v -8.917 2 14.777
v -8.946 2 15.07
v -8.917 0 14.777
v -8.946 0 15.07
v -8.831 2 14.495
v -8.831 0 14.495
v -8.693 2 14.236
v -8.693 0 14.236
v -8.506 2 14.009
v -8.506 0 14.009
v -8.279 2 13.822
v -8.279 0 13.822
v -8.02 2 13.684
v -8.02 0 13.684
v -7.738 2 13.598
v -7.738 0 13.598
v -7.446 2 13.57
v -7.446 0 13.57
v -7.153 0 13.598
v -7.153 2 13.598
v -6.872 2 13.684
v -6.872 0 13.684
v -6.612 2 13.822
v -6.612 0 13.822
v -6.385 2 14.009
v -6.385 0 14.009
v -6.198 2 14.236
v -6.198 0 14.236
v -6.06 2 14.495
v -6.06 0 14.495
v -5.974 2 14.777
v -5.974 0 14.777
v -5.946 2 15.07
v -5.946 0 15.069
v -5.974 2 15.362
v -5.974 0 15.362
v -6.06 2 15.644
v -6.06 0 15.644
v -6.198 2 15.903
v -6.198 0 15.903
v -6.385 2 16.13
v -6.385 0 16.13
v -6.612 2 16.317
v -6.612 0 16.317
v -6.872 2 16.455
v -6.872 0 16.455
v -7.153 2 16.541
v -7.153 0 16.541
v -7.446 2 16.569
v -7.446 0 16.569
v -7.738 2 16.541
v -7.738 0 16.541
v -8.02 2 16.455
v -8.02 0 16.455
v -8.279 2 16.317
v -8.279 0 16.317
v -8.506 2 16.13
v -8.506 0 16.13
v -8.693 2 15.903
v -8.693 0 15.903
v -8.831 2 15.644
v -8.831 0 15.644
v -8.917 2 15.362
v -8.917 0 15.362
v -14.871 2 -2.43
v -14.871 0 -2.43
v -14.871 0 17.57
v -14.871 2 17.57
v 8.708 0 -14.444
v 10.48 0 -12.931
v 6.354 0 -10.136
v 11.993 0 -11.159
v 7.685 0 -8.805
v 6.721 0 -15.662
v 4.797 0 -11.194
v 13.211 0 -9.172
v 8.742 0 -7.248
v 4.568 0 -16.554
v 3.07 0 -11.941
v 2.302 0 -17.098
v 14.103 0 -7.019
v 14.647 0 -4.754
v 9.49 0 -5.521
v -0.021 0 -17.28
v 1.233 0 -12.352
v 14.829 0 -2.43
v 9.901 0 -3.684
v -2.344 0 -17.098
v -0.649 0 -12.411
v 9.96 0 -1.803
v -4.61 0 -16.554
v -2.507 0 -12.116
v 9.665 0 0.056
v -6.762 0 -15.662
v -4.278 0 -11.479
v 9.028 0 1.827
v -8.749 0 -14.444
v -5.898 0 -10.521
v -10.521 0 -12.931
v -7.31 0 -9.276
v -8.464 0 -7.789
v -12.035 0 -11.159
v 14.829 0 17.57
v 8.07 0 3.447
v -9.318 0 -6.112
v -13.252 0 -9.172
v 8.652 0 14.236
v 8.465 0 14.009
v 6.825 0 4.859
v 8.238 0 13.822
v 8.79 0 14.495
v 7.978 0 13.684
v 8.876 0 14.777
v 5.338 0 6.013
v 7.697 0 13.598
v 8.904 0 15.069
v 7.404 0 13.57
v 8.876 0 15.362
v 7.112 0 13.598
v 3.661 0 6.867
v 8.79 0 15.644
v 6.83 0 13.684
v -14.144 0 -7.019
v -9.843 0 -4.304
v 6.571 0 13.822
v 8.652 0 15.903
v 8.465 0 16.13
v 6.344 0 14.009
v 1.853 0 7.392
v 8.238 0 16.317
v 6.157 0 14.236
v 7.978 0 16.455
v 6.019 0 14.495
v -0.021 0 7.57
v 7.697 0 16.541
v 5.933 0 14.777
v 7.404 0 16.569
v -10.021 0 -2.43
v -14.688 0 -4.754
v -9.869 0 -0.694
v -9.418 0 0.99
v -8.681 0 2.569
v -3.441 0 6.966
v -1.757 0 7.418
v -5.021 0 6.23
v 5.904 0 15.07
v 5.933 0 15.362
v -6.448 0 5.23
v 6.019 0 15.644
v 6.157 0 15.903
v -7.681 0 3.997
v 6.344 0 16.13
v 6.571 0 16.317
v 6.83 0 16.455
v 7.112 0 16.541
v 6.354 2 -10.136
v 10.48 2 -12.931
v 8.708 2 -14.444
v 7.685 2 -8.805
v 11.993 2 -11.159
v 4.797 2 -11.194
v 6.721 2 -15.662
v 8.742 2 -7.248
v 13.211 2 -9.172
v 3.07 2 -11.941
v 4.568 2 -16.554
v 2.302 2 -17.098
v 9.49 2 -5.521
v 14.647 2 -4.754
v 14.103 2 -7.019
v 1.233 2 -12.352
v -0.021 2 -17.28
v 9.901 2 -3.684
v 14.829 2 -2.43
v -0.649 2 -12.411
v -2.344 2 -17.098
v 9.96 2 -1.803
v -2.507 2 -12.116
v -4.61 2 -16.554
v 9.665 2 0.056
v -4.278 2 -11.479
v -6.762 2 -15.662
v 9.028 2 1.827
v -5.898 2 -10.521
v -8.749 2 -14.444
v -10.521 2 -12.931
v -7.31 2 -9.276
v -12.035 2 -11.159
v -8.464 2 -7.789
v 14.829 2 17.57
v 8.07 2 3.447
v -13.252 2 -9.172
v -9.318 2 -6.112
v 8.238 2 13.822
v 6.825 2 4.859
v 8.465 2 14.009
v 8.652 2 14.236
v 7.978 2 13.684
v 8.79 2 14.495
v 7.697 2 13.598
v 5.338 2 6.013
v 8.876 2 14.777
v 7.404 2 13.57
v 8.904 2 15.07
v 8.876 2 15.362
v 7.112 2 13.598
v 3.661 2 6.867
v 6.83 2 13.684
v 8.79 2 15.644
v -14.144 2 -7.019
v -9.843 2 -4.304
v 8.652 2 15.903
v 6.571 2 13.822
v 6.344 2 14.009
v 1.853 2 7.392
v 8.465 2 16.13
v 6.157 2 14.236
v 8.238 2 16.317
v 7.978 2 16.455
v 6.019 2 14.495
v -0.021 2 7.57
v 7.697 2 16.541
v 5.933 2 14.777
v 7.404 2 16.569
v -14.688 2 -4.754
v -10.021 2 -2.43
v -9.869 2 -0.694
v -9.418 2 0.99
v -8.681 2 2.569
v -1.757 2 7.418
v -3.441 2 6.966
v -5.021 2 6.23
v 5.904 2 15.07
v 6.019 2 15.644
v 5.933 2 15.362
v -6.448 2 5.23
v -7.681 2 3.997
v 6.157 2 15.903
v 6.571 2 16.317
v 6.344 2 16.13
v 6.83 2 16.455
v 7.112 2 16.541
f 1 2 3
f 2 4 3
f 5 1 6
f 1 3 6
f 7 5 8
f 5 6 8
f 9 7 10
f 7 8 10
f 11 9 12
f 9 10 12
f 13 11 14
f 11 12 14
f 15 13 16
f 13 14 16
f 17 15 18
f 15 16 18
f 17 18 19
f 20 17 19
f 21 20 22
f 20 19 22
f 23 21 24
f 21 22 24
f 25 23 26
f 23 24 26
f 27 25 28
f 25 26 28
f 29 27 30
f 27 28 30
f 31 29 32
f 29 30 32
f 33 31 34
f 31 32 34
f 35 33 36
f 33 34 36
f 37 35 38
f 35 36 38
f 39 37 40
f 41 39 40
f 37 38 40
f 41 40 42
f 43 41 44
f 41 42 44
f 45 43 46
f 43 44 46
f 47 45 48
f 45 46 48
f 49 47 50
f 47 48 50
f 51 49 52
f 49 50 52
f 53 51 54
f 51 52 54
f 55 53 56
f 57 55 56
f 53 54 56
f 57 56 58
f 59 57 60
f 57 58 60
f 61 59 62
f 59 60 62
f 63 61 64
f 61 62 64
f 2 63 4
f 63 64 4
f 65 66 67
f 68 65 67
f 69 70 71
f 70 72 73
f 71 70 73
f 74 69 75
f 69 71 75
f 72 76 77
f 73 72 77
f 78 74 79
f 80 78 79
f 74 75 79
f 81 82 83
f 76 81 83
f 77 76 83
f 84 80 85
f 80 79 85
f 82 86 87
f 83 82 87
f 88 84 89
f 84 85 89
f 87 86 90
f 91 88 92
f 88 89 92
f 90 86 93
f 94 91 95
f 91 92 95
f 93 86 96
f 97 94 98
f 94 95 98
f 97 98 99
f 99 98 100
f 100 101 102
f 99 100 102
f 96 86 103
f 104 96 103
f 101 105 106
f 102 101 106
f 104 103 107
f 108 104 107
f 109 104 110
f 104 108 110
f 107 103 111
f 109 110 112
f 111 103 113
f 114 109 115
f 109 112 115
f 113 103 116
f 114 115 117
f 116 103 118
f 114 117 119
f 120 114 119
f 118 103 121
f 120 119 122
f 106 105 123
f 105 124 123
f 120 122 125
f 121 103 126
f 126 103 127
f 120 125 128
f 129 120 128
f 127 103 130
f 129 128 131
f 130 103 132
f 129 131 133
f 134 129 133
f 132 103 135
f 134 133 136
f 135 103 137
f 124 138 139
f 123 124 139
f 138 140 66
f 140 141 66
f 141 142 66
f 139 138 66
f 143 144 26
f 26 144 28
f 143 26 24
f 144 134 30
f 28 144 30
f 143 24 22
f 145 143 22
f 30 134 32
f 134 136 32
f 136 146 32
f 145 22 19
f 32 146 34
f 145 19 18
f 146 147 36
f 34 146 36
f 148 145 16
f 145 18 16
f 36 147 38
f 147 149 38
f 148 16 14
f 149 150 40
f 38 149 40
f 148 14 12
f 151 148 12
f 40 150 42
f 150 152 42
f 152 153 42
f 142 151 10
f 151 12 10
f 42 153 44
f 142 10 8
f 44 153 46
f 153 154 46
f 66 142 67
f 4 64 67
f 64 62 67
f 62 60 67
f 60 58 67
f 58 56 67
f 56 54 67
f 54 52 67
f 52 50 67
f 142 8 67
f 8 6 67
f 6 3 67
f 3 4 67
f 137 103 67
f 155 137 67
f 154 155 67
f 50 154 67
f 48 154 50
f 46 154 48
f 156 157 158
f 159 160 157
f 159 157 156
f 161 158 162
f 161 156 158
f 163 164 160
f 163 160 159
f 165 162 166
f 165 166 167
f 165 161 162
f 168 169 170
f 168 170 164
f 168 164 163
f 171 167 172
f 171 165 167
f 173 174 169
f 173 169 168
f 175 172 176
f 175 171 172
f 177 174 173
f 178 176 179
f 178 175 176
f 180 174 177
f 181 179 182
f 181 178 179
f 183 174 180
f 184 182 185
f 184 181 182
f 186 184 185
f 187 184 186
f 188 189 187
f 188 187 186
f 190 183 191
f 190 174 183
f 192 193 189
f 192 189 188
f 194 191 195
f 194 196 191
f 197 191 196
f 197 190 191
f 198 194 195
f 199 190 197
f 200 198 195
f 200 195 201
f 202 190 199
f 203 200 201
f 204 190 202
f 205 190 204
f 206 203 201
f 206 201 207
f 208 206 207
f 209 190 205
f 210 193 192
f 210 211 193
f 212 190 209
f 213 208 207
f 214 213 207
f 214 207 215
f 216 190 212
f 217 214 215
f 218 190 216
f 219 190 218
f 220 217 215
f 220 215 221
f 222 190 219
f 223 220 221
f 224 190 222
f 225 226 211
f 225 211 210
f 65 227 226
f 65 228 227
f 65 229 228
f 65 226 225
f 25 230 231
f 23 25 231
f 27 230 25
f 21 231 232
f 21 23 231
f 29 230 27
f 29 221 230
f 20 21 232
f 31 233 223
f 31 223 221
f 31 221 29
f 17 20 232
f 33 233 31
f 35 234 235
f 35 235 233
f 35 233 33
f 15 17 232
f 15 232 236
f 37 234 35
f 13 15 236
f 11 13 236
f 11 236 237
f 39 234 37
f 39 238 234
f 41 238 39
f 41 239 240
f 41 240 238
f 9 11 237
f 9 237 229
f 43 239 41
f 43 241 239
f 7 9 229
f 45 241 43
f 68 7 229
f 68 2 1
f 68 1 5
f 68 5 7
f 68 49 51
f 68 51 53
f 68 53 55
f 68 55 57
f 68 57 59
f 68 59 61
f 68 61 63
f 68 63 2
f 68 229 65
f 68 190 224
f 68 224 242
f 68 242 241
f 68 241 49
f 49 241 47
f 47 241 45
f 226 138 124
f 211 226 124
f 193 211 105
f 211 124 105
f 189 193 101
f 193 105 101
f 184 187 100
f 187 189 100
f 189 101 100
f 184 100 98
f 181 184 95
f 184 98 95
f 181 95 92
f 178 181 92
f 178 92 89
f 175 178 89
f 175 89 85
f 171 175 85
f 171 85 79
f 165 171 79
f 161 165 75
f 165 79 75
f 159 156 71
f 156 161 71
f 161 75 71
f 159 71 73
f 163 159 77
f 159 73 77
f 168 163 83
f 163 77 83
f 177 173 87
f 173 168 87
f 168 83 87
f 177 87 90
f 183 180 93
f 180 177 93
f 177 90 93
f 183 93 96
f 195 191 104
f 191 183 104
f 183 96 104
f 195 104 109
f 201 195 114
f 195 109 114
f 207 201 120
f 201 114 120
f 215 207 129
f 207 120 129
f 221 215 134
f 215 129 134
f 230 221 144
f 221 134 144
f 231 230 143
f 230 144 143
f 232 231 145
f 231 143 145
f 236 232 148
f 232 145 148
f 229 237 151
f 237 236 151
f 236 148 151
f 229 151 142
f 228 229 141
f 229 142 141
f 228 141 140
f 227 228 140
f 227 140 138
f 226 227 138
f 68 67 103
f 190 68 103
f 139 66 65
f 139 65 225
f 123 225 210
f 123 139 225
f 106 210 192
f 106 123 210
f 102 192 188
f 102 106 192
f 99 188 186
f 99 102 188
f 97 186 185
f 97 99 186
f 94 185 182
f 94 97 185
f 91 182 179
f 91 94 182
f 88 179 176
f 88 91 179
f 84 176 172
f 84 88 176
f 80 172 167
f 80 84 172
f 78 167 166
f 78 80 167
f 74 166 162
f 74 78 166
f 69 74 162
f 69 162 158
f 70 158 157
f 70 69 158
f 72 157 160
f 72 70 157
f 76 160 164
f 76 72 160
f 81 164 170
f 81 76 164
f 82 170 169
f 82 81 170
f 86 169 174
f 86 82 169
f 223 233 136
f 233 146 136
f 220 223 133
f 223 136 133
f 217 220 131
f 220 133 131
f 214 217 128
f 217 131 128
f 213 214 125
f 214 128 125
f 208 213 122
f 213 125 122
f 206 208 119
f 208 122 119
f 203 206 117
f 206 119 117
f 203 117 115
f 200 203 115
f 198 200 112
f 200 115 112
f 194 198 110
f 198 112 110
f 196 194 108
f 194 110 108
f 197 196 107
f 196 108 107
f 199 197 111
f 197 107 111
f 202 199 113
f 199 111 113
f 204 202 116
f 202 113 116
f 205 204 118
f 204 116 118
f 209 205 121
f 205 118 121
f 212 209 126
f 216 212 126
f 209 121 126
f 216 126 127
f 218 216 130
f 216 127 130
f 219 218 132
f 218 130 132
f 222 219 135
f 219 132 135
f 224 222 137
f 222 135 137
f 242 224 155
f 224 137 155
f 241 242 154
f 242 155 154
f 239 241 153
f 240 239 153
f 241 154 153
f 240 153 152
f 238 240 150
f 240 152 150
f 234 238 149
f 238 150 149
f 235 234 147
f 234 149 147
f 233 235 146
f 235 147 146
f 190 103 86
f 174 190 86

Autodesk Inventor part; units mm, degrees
ref_plane "YZ Plane" through (0, 0, 0) normal (1, 0, 0) x (0, 1, 0)
ref_plane "XZ Plane" through (0, 0, 0) normal (0, 1, 0) x (-1, 0, 0)
ref_plane "XY Plane" through (0, 0, 0) normal (0, 0, 1) x (1, 0, 0)
sketch "Sketch1" plane through (0, 0, 0) normal (0, 1, 0) x (-1, 0, 0)
  arc A0 (-14.8294, -2.4305) -> (14.8706, -2.4305) centre (0.0206, -2.4305) ccw
  line L0 (14.8706, 17.5695) -> (-14.8294, 17.5695)
  line L1 (14.8706, -2.4305) -> (14.8706, 17.5695)
  line L2 (14.8706, 17.5695) -> (-14.8294, 17.5695)
  line L3 (-14.8294, 17.5695) -> (-14.8294, -2.4305)
  circle A1 centre (0.0206, -2.4305) radius 10
  line L4 (0.0206, 17.5695) -> (0.0206, 7.5695)
  line L5 (0.0206, 17.5695) -> (0.0206, 15.0695)
  line L6 (-14.8294, 15.0695) -> (0.0206, 15.0695)
  line L7 (1.5206, 17.5695) -> (1.5206, 12.5695)
  line L8 (0.0206, 15.0695) -> (14.8706, 15.0695)
  circle A2 centre (-7.4044, 15.0695) radius 1.5
  circle A3 centre (7.4456, 15.0695) radius 1.5
  point P0 (0, 0)
  dimension "d0" = 20
  dimension "d1" = 3
  dimension "d2" = 3
extrude "Extrusion1" add sketch "Sketch1" along normal blind 2 contours L3 L6 A2 L8 A3 L1 A0 | L3 L0 L4 L6 A2 | L8 A3 L7 L0 L1 | L0 L7 L8 L4
thread "Thread1" size "M3x0.5" class "6H" standard "ANSI Metric M Profile" full length
thread "Thread2" size "M3x0.5" class "6H" standard "ANSI Metric M Profile" full length
properties part number "Holder Cover"
